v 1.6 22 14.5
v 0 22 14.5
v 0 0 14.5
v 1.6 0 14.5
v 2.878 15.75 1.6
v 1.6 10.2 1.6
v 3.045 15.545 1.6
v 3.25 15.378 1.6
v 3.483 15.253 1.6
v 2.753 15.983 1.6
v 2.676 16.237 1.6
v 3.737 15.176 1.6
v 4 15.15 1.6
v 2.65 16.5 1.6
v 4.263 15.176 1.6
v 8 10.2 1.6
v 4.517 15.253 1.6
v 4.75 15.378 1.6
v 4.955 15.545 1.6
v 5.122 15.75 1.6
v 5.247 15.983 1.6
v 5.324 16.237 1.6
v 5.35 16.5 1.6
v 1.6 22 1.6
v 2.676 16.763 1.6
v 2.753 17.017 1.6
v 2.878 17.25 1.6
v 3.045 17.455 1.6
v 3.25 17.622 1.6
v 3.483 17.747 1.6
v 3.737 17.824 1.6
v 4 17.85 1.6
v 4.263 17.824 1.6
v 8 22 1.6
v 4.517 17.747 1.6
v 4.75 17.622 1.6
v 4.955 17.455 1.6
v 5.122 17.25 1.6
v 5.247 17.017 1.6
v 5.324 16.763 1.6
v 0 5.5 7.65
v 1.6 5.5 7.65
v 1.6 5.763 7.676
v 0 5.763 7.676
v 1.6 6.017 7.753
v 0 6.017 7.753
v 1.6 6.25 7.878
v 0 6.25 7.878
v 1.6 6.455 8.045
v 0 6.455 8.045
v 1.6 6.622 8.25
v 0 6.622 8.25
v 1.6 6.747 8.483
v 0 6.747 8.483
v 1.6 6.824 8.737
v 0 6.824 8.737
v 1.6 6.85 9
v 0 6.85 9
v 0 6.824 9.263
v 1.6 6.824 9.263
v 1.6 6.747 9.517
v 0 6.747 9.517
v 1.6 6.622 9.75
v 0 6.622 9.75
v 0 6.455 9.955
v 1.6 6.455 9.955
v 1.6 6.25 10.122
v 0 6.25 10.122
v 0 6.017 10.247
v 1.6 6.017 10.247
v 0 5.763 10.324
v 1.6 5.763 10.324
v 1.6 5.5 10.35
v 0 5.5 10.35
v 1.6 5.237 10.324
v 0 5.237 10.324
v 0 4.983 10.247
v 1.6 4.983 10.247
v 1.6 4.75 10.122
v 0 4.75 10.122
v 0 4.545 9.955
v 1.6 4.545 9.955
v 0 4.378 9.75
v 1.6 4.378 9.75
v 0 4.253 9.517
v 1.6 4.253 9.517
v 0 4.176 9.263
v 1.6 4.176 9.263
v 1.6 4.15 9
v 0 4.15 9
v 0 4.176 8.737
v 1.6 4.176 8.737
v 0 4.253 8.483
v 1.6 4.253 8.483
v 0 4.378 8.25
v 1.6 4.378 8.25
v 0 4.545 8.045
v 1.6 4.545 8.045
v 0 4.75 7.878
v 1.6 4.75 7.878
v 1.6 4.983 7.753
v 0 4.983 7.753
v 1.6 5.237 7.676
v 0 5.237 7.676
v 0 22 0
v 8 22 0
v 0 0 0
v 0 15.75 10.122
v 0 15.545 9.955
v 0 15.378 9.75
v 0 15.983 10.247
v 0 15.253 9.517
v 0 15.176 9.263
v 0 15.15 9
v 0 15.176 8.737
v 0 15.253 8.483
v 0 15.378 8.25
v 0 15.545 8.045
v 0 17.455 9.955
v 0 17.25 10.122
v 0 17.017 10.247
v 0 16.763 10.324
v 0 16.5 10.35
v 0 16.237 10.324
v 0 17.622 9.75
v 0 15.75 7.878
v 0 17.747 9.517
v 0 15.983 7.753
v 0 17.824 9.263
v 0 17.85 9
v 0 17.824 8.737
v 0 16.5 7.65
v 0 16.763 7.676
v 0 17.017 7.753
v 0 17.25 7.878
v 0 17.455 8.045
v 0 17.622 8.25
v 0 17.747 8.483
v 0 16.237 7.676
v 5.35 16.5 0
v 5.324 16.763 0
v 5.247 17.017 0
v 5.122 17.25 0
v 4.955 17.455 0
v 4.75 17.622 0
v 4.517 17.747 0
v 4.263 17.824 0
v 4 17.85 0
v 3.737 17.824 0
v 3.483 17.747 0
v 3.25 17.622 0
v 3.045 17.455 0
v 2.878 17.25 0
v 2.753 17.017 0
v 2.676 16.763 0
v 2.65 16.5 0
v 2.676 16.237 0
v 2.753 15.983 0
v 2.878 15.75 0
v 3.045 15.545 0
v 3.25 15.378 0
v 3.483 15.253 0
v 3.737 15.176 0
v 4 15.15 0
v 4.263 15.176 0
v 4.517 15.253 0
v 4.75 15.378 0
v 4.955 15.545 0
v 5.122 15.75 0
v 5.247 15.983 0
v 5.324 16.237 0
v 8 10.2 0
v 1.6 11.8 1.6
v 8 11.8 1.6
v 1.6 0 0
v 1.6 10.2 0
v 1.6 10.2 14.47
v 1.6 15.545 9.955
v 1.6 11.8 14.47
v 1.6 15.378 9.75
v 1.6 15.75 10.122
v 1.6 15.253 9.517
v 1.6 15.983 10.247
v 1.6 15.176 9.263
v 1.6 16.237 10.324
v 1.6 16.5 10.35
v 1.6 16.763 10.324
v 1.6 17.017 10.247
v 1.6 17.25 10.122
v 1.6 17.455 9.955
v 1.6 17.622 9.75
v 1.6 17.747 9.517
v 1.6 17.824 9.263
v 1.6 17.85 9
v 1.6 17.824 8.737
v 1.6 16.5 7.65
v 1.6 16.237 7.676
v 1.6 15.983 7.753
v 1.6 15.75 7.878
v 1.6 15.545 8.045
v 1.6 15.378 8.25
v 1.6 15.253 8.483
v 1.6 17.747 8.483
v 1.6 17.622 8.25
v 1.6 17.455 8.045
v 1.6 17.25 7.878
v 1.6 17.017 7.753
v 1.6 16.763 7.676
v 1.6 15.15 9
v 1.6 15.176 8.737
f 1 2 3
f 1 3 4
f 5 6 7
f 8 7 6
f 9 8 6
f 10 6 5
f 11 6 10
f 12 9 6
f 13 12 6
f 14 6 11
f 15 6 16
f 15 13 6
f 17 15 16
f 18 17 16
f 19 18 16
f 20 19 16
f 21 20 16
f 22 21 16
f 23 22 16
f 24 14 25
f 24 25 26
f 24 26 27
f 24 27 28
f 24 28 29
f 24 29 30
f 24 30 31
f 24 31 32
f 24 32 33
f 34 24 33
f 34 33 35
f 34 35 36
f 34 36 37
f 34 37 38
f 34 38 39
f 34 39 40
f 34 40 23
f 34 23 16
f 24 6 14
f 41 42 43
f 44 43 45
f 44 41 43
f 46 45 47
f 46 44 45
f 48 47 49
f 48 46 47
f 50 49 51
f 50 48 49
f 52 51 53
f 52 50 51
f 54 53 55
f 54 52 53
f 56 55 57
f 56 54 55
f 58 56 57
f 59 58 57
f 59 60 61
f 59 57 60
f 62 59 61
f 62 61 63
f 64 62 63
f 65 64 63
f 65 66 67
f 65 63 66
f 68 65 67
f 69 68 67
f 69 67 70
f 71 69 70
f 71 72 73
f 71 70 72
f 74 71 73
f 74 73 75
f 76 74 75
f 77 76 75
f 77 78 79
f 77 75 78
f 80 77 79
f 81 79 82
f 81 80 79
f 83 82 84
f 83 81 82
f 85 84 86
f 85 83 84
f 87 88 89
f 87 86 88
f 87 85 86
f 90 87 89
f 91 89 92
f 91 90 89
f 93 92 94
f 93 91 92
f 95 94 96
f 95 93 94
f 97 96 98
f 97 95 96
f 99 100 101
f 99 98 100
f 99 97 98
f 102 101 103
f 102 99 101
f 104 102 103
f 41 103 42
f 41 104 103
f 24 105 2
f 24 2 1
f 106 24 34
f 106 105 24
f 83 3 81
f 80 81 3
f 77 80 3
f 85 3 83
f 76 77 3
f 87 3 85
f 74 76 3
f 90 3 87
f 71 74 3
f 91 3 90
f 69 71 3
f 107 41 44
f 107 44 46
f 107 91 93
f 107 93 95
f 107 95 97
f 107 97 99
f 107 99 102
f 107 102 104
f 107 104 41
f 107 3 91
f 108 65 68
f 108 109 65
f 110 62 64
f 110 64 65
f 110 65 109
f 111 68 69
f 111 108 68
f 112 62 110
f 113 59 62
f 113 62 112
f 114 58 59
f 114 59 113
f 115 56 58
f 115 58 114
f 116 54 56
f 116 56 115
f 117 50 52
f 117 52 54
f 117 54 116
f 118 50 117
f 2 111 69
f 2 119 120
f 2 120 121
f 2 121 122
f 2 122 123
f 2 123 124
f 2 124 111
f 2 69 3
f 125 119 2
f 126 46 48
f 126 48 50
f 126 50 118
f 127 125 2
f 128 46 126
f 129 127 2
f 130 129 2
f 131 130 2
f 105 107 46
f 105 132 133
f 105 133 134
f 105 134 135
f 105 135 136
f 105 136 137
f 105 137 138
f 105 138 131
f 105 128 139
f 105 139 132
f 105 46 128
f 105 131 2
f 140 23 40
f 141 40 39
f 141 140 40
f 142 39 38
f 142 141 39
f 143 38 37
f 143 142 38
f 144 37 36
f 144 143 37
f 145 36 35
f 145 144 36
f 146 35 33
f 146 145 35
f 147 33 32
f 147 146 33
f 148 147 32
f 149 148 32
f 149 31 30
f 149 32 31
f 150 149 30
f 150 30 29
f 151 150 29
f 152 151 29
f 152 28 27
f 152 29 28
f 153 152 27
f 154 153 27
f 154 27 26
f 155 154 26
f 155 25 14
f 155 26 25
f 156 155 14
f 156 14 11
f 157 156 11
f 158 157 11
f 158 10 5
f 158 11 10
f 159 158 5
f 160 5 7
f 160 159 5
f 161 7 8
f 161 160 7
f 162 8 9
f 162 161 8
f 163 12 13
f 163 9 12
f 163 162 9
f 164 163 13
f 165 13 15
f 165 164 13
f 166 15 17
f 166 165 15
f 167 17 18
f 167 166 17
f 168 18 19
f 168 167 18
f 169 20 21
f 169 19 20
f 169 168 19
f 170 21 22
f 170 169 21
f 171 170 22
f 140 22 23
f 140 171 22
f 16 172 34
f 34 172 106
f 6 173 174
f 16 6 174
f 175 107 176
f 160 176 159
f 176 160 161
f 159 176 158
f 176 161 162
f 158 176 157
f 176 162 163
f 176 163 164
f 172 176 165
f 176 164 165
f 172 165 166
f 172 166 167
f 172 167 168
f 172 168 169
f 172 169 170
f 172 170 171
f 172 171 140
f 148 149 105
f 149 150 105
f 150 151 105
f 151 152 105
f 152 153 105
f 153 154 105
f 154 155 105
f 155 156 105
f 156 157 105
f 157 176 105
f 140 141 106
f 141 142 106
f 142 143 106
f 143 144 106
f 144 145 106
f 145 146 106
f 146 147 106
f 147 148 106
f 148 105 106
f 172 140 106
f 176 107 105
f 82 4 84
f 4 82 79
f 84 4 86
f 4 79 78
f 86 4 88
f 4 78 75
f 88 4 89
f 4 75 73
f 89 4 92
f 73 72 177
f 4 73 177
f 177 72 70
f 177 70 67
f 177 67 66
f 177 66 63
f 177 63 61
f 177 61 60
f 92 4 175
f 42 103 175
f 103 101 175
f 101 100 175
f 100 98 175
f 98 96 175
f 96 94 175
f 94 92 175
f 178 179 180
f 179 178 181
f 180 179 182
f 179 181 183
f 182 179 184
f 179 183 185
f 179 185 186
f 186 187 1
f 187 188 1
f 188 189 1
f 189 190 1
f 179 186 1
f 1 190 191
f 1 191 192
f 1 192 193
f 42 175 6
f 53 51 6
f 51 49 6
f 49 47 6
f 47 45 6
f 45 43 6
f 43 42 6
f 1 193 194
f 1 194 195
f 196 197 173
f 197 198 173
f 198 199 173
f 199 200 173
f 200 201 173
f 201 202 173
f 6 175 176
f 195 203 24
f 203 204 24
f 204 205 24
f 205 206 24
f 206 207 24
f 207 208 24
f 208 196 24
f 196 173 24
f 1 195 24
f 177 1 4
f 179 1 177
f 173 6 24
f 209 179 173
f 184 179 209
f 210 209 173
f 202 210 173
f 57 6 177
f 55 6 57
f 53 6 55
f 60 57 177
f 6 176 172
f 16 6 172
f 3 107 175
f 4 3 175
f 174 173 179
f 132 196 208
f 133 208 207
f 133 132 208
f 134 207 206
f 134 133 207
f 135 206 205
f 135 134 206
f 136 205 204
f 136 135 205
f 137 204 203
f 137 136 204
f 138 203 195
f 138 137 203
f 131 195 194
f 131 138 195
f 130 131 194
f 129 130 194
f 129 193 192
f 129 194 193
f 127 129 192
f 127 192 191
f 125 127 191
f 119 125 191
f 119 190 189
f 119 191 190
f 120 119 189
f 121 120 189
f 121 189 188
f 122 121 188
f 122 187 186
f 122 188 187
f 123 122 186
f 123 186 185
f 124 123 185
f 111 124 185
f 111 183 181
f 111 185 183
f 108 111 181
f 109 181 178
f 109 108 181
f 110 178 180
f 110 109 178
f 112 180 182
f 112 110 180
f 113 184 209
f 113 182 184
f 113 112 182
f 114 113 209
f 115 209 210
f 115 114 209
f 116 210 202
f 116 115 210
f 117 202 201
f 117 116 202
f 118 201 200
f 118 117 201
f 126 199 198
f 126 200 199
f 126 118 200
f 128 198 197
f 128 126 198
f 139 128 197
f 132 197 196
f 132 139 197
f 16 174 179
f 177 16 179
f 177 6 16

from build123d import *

# Parameters (mm, degrees)
BOX002_W          = 6.4
BOX002_H          = 11.8
BOX002_DEPTH      = 1.6
CYLINDER002_R     = 1.35
CYLINDER002_DEPTH = 10
CYLINDER001_R     = 1.35
CYLINDER001_DEPTH = 10
CYLINDER_R        = 1.35
CYLINDER_DEPTH    = 10
BOX_W             = 1.6
BOX_H             = 22
BOX_DEPTH         = 14.5
BOX001_W          = 6.4
BOX001_H          = 11.8
BOX001_DEPTH      = 1.6
CYLINDER003_R     = 1.35
CYLINDER003_DEPTH = 10
BOX003_W          = 6.4
BOX003_H          = 11.8
BOX003_DEPTH      = 1.6
EXTRUDE_DEPTH     = 1.6


with BuildPart() as cube002:
    # Box002 → Box002 (new body)
    with BuildSketch(Plane(origin=(1.6, 0, 0), x_dir=(1, 0, 0), z_dir=(0, 0, 1))):
        with Locations((3.2, 5.9)):
            Rectangle(BOX002_W, BOX002_H)
    extrude(amount=BOX002_DEPTH)


with BuildPart() as cylinder002:
    # Cylinder002 → Cylinder002 (new body)
    with BuildSketch(Plane(origin=(4, 5.5, 0), x_dir=(1, 0, 0), z_dir=(0, 0, 1))):
        Circle(CYLINDER002_R)
    extrude(amount=CYLINDER002_DEPTH)


with BuildPart() as cylinder001:
    # Cylinder001 → Cylinder001 (new body)
    with BuildSketch(Plane(origin=(0, 16.5, 9), x_dir=(0, 0, -1), z_dir=(1, 0, 0))):
        Circle(CYLINDER001_R)
    extrude(amount=CYLINDER001_DEPTH)


with BuildPart() as cylinder:
    # Cylinder → Cylinder (new body)
    with BuildSketch(Plane(origin=(0, 5.5, 9), x_dir=(0, 0, -1), z_dir=(1, 0, 0))):
        Circle(CYLINDER_R)
    extrude(amount=CYLINDER_DEPTH)


with BuildPart() as cut001:
    # Box → Box (new body)
    with BuildSketch(Plane.XY):
        with Locations((0.8, 11)):
            Rectangle(BOX_W, BOX_H)
    extrude(amount=BOX_DEPTH)

    # Cut: cut Cylinder
    add(cylinder.part, mode=Mode.SUBTRACT)

    # Cut001: cut Cylinder001
    add(cylinder001.part, mode=Mode.SUBTRACT)


with BuildPart() as cut003:
    # Box001 → Box001 (new body)
    with BuildSketch(Plane(origin=(1.6, 0, 0), x_dir=(1, 0, 0), z_dir=(0, 0, 1))):
        with Locations((3.2, 5.9)):
            Rectangle(BOX001_W, BOX001_H)
    extrude(amount=BOX001_DEPTH)

    # Connect: union Cut001
    add(cut001.part)

    # Cut002: cut Cylinder002
    add(cylinder002.part, mode=Mode.SUBTRACT)

    # Cut003: cut Cube002
    add(cube002.part, mode=Mode.SUBTRACT)


with BuildPart() as cylinder003:
    # Cylinder003 → Cylinder003 (new body)
    with BuildSketch(Plane(origin=(4, 16.5, 0), x_dir=(1, 0, 0), z_dir=(0, 0, 1))):
        Circle(CYLINDER003_R)
    extrude(amount=CYLINDER003_DEPTH)


with BuildPart() as cut004:
    # Box003 → Box003 (new body)
    with BuildSketch(Plane(origin=(1.6, 10.2, 0), x_dir=(1, 0, 0), z_dir=(0, 0, 1))):
        with Locations((3.2, 5.9)):
            Rectangle(BOX003_W, BOX003_H)
    extrude(amount=BOX003_DEPTH)

    # Cut004: cut Cylinder003
    add(cylinder003.part, mode=Mode.SUBTRACT)


with BuildPart() as connect001:
    # Sketch → Extrude (new body)
    with BuildSketch(Plane.XZ):
        Polygon((1.593675, 14.483153), (1.593675, 1.60001), (7.999931, 1.60001), align=None)
    extrude(amount=EXTRUDE_DEPTH)


with BuildPart() as connect001_1:
    # Extrude placement: moved
    add(connect001.part.moved(Location((0, 11.8, 0))))

    # Connect001: union Cut003, Cut004
    add(cut003.part)
    add(cut004.part)


solid = connect001_1.part
